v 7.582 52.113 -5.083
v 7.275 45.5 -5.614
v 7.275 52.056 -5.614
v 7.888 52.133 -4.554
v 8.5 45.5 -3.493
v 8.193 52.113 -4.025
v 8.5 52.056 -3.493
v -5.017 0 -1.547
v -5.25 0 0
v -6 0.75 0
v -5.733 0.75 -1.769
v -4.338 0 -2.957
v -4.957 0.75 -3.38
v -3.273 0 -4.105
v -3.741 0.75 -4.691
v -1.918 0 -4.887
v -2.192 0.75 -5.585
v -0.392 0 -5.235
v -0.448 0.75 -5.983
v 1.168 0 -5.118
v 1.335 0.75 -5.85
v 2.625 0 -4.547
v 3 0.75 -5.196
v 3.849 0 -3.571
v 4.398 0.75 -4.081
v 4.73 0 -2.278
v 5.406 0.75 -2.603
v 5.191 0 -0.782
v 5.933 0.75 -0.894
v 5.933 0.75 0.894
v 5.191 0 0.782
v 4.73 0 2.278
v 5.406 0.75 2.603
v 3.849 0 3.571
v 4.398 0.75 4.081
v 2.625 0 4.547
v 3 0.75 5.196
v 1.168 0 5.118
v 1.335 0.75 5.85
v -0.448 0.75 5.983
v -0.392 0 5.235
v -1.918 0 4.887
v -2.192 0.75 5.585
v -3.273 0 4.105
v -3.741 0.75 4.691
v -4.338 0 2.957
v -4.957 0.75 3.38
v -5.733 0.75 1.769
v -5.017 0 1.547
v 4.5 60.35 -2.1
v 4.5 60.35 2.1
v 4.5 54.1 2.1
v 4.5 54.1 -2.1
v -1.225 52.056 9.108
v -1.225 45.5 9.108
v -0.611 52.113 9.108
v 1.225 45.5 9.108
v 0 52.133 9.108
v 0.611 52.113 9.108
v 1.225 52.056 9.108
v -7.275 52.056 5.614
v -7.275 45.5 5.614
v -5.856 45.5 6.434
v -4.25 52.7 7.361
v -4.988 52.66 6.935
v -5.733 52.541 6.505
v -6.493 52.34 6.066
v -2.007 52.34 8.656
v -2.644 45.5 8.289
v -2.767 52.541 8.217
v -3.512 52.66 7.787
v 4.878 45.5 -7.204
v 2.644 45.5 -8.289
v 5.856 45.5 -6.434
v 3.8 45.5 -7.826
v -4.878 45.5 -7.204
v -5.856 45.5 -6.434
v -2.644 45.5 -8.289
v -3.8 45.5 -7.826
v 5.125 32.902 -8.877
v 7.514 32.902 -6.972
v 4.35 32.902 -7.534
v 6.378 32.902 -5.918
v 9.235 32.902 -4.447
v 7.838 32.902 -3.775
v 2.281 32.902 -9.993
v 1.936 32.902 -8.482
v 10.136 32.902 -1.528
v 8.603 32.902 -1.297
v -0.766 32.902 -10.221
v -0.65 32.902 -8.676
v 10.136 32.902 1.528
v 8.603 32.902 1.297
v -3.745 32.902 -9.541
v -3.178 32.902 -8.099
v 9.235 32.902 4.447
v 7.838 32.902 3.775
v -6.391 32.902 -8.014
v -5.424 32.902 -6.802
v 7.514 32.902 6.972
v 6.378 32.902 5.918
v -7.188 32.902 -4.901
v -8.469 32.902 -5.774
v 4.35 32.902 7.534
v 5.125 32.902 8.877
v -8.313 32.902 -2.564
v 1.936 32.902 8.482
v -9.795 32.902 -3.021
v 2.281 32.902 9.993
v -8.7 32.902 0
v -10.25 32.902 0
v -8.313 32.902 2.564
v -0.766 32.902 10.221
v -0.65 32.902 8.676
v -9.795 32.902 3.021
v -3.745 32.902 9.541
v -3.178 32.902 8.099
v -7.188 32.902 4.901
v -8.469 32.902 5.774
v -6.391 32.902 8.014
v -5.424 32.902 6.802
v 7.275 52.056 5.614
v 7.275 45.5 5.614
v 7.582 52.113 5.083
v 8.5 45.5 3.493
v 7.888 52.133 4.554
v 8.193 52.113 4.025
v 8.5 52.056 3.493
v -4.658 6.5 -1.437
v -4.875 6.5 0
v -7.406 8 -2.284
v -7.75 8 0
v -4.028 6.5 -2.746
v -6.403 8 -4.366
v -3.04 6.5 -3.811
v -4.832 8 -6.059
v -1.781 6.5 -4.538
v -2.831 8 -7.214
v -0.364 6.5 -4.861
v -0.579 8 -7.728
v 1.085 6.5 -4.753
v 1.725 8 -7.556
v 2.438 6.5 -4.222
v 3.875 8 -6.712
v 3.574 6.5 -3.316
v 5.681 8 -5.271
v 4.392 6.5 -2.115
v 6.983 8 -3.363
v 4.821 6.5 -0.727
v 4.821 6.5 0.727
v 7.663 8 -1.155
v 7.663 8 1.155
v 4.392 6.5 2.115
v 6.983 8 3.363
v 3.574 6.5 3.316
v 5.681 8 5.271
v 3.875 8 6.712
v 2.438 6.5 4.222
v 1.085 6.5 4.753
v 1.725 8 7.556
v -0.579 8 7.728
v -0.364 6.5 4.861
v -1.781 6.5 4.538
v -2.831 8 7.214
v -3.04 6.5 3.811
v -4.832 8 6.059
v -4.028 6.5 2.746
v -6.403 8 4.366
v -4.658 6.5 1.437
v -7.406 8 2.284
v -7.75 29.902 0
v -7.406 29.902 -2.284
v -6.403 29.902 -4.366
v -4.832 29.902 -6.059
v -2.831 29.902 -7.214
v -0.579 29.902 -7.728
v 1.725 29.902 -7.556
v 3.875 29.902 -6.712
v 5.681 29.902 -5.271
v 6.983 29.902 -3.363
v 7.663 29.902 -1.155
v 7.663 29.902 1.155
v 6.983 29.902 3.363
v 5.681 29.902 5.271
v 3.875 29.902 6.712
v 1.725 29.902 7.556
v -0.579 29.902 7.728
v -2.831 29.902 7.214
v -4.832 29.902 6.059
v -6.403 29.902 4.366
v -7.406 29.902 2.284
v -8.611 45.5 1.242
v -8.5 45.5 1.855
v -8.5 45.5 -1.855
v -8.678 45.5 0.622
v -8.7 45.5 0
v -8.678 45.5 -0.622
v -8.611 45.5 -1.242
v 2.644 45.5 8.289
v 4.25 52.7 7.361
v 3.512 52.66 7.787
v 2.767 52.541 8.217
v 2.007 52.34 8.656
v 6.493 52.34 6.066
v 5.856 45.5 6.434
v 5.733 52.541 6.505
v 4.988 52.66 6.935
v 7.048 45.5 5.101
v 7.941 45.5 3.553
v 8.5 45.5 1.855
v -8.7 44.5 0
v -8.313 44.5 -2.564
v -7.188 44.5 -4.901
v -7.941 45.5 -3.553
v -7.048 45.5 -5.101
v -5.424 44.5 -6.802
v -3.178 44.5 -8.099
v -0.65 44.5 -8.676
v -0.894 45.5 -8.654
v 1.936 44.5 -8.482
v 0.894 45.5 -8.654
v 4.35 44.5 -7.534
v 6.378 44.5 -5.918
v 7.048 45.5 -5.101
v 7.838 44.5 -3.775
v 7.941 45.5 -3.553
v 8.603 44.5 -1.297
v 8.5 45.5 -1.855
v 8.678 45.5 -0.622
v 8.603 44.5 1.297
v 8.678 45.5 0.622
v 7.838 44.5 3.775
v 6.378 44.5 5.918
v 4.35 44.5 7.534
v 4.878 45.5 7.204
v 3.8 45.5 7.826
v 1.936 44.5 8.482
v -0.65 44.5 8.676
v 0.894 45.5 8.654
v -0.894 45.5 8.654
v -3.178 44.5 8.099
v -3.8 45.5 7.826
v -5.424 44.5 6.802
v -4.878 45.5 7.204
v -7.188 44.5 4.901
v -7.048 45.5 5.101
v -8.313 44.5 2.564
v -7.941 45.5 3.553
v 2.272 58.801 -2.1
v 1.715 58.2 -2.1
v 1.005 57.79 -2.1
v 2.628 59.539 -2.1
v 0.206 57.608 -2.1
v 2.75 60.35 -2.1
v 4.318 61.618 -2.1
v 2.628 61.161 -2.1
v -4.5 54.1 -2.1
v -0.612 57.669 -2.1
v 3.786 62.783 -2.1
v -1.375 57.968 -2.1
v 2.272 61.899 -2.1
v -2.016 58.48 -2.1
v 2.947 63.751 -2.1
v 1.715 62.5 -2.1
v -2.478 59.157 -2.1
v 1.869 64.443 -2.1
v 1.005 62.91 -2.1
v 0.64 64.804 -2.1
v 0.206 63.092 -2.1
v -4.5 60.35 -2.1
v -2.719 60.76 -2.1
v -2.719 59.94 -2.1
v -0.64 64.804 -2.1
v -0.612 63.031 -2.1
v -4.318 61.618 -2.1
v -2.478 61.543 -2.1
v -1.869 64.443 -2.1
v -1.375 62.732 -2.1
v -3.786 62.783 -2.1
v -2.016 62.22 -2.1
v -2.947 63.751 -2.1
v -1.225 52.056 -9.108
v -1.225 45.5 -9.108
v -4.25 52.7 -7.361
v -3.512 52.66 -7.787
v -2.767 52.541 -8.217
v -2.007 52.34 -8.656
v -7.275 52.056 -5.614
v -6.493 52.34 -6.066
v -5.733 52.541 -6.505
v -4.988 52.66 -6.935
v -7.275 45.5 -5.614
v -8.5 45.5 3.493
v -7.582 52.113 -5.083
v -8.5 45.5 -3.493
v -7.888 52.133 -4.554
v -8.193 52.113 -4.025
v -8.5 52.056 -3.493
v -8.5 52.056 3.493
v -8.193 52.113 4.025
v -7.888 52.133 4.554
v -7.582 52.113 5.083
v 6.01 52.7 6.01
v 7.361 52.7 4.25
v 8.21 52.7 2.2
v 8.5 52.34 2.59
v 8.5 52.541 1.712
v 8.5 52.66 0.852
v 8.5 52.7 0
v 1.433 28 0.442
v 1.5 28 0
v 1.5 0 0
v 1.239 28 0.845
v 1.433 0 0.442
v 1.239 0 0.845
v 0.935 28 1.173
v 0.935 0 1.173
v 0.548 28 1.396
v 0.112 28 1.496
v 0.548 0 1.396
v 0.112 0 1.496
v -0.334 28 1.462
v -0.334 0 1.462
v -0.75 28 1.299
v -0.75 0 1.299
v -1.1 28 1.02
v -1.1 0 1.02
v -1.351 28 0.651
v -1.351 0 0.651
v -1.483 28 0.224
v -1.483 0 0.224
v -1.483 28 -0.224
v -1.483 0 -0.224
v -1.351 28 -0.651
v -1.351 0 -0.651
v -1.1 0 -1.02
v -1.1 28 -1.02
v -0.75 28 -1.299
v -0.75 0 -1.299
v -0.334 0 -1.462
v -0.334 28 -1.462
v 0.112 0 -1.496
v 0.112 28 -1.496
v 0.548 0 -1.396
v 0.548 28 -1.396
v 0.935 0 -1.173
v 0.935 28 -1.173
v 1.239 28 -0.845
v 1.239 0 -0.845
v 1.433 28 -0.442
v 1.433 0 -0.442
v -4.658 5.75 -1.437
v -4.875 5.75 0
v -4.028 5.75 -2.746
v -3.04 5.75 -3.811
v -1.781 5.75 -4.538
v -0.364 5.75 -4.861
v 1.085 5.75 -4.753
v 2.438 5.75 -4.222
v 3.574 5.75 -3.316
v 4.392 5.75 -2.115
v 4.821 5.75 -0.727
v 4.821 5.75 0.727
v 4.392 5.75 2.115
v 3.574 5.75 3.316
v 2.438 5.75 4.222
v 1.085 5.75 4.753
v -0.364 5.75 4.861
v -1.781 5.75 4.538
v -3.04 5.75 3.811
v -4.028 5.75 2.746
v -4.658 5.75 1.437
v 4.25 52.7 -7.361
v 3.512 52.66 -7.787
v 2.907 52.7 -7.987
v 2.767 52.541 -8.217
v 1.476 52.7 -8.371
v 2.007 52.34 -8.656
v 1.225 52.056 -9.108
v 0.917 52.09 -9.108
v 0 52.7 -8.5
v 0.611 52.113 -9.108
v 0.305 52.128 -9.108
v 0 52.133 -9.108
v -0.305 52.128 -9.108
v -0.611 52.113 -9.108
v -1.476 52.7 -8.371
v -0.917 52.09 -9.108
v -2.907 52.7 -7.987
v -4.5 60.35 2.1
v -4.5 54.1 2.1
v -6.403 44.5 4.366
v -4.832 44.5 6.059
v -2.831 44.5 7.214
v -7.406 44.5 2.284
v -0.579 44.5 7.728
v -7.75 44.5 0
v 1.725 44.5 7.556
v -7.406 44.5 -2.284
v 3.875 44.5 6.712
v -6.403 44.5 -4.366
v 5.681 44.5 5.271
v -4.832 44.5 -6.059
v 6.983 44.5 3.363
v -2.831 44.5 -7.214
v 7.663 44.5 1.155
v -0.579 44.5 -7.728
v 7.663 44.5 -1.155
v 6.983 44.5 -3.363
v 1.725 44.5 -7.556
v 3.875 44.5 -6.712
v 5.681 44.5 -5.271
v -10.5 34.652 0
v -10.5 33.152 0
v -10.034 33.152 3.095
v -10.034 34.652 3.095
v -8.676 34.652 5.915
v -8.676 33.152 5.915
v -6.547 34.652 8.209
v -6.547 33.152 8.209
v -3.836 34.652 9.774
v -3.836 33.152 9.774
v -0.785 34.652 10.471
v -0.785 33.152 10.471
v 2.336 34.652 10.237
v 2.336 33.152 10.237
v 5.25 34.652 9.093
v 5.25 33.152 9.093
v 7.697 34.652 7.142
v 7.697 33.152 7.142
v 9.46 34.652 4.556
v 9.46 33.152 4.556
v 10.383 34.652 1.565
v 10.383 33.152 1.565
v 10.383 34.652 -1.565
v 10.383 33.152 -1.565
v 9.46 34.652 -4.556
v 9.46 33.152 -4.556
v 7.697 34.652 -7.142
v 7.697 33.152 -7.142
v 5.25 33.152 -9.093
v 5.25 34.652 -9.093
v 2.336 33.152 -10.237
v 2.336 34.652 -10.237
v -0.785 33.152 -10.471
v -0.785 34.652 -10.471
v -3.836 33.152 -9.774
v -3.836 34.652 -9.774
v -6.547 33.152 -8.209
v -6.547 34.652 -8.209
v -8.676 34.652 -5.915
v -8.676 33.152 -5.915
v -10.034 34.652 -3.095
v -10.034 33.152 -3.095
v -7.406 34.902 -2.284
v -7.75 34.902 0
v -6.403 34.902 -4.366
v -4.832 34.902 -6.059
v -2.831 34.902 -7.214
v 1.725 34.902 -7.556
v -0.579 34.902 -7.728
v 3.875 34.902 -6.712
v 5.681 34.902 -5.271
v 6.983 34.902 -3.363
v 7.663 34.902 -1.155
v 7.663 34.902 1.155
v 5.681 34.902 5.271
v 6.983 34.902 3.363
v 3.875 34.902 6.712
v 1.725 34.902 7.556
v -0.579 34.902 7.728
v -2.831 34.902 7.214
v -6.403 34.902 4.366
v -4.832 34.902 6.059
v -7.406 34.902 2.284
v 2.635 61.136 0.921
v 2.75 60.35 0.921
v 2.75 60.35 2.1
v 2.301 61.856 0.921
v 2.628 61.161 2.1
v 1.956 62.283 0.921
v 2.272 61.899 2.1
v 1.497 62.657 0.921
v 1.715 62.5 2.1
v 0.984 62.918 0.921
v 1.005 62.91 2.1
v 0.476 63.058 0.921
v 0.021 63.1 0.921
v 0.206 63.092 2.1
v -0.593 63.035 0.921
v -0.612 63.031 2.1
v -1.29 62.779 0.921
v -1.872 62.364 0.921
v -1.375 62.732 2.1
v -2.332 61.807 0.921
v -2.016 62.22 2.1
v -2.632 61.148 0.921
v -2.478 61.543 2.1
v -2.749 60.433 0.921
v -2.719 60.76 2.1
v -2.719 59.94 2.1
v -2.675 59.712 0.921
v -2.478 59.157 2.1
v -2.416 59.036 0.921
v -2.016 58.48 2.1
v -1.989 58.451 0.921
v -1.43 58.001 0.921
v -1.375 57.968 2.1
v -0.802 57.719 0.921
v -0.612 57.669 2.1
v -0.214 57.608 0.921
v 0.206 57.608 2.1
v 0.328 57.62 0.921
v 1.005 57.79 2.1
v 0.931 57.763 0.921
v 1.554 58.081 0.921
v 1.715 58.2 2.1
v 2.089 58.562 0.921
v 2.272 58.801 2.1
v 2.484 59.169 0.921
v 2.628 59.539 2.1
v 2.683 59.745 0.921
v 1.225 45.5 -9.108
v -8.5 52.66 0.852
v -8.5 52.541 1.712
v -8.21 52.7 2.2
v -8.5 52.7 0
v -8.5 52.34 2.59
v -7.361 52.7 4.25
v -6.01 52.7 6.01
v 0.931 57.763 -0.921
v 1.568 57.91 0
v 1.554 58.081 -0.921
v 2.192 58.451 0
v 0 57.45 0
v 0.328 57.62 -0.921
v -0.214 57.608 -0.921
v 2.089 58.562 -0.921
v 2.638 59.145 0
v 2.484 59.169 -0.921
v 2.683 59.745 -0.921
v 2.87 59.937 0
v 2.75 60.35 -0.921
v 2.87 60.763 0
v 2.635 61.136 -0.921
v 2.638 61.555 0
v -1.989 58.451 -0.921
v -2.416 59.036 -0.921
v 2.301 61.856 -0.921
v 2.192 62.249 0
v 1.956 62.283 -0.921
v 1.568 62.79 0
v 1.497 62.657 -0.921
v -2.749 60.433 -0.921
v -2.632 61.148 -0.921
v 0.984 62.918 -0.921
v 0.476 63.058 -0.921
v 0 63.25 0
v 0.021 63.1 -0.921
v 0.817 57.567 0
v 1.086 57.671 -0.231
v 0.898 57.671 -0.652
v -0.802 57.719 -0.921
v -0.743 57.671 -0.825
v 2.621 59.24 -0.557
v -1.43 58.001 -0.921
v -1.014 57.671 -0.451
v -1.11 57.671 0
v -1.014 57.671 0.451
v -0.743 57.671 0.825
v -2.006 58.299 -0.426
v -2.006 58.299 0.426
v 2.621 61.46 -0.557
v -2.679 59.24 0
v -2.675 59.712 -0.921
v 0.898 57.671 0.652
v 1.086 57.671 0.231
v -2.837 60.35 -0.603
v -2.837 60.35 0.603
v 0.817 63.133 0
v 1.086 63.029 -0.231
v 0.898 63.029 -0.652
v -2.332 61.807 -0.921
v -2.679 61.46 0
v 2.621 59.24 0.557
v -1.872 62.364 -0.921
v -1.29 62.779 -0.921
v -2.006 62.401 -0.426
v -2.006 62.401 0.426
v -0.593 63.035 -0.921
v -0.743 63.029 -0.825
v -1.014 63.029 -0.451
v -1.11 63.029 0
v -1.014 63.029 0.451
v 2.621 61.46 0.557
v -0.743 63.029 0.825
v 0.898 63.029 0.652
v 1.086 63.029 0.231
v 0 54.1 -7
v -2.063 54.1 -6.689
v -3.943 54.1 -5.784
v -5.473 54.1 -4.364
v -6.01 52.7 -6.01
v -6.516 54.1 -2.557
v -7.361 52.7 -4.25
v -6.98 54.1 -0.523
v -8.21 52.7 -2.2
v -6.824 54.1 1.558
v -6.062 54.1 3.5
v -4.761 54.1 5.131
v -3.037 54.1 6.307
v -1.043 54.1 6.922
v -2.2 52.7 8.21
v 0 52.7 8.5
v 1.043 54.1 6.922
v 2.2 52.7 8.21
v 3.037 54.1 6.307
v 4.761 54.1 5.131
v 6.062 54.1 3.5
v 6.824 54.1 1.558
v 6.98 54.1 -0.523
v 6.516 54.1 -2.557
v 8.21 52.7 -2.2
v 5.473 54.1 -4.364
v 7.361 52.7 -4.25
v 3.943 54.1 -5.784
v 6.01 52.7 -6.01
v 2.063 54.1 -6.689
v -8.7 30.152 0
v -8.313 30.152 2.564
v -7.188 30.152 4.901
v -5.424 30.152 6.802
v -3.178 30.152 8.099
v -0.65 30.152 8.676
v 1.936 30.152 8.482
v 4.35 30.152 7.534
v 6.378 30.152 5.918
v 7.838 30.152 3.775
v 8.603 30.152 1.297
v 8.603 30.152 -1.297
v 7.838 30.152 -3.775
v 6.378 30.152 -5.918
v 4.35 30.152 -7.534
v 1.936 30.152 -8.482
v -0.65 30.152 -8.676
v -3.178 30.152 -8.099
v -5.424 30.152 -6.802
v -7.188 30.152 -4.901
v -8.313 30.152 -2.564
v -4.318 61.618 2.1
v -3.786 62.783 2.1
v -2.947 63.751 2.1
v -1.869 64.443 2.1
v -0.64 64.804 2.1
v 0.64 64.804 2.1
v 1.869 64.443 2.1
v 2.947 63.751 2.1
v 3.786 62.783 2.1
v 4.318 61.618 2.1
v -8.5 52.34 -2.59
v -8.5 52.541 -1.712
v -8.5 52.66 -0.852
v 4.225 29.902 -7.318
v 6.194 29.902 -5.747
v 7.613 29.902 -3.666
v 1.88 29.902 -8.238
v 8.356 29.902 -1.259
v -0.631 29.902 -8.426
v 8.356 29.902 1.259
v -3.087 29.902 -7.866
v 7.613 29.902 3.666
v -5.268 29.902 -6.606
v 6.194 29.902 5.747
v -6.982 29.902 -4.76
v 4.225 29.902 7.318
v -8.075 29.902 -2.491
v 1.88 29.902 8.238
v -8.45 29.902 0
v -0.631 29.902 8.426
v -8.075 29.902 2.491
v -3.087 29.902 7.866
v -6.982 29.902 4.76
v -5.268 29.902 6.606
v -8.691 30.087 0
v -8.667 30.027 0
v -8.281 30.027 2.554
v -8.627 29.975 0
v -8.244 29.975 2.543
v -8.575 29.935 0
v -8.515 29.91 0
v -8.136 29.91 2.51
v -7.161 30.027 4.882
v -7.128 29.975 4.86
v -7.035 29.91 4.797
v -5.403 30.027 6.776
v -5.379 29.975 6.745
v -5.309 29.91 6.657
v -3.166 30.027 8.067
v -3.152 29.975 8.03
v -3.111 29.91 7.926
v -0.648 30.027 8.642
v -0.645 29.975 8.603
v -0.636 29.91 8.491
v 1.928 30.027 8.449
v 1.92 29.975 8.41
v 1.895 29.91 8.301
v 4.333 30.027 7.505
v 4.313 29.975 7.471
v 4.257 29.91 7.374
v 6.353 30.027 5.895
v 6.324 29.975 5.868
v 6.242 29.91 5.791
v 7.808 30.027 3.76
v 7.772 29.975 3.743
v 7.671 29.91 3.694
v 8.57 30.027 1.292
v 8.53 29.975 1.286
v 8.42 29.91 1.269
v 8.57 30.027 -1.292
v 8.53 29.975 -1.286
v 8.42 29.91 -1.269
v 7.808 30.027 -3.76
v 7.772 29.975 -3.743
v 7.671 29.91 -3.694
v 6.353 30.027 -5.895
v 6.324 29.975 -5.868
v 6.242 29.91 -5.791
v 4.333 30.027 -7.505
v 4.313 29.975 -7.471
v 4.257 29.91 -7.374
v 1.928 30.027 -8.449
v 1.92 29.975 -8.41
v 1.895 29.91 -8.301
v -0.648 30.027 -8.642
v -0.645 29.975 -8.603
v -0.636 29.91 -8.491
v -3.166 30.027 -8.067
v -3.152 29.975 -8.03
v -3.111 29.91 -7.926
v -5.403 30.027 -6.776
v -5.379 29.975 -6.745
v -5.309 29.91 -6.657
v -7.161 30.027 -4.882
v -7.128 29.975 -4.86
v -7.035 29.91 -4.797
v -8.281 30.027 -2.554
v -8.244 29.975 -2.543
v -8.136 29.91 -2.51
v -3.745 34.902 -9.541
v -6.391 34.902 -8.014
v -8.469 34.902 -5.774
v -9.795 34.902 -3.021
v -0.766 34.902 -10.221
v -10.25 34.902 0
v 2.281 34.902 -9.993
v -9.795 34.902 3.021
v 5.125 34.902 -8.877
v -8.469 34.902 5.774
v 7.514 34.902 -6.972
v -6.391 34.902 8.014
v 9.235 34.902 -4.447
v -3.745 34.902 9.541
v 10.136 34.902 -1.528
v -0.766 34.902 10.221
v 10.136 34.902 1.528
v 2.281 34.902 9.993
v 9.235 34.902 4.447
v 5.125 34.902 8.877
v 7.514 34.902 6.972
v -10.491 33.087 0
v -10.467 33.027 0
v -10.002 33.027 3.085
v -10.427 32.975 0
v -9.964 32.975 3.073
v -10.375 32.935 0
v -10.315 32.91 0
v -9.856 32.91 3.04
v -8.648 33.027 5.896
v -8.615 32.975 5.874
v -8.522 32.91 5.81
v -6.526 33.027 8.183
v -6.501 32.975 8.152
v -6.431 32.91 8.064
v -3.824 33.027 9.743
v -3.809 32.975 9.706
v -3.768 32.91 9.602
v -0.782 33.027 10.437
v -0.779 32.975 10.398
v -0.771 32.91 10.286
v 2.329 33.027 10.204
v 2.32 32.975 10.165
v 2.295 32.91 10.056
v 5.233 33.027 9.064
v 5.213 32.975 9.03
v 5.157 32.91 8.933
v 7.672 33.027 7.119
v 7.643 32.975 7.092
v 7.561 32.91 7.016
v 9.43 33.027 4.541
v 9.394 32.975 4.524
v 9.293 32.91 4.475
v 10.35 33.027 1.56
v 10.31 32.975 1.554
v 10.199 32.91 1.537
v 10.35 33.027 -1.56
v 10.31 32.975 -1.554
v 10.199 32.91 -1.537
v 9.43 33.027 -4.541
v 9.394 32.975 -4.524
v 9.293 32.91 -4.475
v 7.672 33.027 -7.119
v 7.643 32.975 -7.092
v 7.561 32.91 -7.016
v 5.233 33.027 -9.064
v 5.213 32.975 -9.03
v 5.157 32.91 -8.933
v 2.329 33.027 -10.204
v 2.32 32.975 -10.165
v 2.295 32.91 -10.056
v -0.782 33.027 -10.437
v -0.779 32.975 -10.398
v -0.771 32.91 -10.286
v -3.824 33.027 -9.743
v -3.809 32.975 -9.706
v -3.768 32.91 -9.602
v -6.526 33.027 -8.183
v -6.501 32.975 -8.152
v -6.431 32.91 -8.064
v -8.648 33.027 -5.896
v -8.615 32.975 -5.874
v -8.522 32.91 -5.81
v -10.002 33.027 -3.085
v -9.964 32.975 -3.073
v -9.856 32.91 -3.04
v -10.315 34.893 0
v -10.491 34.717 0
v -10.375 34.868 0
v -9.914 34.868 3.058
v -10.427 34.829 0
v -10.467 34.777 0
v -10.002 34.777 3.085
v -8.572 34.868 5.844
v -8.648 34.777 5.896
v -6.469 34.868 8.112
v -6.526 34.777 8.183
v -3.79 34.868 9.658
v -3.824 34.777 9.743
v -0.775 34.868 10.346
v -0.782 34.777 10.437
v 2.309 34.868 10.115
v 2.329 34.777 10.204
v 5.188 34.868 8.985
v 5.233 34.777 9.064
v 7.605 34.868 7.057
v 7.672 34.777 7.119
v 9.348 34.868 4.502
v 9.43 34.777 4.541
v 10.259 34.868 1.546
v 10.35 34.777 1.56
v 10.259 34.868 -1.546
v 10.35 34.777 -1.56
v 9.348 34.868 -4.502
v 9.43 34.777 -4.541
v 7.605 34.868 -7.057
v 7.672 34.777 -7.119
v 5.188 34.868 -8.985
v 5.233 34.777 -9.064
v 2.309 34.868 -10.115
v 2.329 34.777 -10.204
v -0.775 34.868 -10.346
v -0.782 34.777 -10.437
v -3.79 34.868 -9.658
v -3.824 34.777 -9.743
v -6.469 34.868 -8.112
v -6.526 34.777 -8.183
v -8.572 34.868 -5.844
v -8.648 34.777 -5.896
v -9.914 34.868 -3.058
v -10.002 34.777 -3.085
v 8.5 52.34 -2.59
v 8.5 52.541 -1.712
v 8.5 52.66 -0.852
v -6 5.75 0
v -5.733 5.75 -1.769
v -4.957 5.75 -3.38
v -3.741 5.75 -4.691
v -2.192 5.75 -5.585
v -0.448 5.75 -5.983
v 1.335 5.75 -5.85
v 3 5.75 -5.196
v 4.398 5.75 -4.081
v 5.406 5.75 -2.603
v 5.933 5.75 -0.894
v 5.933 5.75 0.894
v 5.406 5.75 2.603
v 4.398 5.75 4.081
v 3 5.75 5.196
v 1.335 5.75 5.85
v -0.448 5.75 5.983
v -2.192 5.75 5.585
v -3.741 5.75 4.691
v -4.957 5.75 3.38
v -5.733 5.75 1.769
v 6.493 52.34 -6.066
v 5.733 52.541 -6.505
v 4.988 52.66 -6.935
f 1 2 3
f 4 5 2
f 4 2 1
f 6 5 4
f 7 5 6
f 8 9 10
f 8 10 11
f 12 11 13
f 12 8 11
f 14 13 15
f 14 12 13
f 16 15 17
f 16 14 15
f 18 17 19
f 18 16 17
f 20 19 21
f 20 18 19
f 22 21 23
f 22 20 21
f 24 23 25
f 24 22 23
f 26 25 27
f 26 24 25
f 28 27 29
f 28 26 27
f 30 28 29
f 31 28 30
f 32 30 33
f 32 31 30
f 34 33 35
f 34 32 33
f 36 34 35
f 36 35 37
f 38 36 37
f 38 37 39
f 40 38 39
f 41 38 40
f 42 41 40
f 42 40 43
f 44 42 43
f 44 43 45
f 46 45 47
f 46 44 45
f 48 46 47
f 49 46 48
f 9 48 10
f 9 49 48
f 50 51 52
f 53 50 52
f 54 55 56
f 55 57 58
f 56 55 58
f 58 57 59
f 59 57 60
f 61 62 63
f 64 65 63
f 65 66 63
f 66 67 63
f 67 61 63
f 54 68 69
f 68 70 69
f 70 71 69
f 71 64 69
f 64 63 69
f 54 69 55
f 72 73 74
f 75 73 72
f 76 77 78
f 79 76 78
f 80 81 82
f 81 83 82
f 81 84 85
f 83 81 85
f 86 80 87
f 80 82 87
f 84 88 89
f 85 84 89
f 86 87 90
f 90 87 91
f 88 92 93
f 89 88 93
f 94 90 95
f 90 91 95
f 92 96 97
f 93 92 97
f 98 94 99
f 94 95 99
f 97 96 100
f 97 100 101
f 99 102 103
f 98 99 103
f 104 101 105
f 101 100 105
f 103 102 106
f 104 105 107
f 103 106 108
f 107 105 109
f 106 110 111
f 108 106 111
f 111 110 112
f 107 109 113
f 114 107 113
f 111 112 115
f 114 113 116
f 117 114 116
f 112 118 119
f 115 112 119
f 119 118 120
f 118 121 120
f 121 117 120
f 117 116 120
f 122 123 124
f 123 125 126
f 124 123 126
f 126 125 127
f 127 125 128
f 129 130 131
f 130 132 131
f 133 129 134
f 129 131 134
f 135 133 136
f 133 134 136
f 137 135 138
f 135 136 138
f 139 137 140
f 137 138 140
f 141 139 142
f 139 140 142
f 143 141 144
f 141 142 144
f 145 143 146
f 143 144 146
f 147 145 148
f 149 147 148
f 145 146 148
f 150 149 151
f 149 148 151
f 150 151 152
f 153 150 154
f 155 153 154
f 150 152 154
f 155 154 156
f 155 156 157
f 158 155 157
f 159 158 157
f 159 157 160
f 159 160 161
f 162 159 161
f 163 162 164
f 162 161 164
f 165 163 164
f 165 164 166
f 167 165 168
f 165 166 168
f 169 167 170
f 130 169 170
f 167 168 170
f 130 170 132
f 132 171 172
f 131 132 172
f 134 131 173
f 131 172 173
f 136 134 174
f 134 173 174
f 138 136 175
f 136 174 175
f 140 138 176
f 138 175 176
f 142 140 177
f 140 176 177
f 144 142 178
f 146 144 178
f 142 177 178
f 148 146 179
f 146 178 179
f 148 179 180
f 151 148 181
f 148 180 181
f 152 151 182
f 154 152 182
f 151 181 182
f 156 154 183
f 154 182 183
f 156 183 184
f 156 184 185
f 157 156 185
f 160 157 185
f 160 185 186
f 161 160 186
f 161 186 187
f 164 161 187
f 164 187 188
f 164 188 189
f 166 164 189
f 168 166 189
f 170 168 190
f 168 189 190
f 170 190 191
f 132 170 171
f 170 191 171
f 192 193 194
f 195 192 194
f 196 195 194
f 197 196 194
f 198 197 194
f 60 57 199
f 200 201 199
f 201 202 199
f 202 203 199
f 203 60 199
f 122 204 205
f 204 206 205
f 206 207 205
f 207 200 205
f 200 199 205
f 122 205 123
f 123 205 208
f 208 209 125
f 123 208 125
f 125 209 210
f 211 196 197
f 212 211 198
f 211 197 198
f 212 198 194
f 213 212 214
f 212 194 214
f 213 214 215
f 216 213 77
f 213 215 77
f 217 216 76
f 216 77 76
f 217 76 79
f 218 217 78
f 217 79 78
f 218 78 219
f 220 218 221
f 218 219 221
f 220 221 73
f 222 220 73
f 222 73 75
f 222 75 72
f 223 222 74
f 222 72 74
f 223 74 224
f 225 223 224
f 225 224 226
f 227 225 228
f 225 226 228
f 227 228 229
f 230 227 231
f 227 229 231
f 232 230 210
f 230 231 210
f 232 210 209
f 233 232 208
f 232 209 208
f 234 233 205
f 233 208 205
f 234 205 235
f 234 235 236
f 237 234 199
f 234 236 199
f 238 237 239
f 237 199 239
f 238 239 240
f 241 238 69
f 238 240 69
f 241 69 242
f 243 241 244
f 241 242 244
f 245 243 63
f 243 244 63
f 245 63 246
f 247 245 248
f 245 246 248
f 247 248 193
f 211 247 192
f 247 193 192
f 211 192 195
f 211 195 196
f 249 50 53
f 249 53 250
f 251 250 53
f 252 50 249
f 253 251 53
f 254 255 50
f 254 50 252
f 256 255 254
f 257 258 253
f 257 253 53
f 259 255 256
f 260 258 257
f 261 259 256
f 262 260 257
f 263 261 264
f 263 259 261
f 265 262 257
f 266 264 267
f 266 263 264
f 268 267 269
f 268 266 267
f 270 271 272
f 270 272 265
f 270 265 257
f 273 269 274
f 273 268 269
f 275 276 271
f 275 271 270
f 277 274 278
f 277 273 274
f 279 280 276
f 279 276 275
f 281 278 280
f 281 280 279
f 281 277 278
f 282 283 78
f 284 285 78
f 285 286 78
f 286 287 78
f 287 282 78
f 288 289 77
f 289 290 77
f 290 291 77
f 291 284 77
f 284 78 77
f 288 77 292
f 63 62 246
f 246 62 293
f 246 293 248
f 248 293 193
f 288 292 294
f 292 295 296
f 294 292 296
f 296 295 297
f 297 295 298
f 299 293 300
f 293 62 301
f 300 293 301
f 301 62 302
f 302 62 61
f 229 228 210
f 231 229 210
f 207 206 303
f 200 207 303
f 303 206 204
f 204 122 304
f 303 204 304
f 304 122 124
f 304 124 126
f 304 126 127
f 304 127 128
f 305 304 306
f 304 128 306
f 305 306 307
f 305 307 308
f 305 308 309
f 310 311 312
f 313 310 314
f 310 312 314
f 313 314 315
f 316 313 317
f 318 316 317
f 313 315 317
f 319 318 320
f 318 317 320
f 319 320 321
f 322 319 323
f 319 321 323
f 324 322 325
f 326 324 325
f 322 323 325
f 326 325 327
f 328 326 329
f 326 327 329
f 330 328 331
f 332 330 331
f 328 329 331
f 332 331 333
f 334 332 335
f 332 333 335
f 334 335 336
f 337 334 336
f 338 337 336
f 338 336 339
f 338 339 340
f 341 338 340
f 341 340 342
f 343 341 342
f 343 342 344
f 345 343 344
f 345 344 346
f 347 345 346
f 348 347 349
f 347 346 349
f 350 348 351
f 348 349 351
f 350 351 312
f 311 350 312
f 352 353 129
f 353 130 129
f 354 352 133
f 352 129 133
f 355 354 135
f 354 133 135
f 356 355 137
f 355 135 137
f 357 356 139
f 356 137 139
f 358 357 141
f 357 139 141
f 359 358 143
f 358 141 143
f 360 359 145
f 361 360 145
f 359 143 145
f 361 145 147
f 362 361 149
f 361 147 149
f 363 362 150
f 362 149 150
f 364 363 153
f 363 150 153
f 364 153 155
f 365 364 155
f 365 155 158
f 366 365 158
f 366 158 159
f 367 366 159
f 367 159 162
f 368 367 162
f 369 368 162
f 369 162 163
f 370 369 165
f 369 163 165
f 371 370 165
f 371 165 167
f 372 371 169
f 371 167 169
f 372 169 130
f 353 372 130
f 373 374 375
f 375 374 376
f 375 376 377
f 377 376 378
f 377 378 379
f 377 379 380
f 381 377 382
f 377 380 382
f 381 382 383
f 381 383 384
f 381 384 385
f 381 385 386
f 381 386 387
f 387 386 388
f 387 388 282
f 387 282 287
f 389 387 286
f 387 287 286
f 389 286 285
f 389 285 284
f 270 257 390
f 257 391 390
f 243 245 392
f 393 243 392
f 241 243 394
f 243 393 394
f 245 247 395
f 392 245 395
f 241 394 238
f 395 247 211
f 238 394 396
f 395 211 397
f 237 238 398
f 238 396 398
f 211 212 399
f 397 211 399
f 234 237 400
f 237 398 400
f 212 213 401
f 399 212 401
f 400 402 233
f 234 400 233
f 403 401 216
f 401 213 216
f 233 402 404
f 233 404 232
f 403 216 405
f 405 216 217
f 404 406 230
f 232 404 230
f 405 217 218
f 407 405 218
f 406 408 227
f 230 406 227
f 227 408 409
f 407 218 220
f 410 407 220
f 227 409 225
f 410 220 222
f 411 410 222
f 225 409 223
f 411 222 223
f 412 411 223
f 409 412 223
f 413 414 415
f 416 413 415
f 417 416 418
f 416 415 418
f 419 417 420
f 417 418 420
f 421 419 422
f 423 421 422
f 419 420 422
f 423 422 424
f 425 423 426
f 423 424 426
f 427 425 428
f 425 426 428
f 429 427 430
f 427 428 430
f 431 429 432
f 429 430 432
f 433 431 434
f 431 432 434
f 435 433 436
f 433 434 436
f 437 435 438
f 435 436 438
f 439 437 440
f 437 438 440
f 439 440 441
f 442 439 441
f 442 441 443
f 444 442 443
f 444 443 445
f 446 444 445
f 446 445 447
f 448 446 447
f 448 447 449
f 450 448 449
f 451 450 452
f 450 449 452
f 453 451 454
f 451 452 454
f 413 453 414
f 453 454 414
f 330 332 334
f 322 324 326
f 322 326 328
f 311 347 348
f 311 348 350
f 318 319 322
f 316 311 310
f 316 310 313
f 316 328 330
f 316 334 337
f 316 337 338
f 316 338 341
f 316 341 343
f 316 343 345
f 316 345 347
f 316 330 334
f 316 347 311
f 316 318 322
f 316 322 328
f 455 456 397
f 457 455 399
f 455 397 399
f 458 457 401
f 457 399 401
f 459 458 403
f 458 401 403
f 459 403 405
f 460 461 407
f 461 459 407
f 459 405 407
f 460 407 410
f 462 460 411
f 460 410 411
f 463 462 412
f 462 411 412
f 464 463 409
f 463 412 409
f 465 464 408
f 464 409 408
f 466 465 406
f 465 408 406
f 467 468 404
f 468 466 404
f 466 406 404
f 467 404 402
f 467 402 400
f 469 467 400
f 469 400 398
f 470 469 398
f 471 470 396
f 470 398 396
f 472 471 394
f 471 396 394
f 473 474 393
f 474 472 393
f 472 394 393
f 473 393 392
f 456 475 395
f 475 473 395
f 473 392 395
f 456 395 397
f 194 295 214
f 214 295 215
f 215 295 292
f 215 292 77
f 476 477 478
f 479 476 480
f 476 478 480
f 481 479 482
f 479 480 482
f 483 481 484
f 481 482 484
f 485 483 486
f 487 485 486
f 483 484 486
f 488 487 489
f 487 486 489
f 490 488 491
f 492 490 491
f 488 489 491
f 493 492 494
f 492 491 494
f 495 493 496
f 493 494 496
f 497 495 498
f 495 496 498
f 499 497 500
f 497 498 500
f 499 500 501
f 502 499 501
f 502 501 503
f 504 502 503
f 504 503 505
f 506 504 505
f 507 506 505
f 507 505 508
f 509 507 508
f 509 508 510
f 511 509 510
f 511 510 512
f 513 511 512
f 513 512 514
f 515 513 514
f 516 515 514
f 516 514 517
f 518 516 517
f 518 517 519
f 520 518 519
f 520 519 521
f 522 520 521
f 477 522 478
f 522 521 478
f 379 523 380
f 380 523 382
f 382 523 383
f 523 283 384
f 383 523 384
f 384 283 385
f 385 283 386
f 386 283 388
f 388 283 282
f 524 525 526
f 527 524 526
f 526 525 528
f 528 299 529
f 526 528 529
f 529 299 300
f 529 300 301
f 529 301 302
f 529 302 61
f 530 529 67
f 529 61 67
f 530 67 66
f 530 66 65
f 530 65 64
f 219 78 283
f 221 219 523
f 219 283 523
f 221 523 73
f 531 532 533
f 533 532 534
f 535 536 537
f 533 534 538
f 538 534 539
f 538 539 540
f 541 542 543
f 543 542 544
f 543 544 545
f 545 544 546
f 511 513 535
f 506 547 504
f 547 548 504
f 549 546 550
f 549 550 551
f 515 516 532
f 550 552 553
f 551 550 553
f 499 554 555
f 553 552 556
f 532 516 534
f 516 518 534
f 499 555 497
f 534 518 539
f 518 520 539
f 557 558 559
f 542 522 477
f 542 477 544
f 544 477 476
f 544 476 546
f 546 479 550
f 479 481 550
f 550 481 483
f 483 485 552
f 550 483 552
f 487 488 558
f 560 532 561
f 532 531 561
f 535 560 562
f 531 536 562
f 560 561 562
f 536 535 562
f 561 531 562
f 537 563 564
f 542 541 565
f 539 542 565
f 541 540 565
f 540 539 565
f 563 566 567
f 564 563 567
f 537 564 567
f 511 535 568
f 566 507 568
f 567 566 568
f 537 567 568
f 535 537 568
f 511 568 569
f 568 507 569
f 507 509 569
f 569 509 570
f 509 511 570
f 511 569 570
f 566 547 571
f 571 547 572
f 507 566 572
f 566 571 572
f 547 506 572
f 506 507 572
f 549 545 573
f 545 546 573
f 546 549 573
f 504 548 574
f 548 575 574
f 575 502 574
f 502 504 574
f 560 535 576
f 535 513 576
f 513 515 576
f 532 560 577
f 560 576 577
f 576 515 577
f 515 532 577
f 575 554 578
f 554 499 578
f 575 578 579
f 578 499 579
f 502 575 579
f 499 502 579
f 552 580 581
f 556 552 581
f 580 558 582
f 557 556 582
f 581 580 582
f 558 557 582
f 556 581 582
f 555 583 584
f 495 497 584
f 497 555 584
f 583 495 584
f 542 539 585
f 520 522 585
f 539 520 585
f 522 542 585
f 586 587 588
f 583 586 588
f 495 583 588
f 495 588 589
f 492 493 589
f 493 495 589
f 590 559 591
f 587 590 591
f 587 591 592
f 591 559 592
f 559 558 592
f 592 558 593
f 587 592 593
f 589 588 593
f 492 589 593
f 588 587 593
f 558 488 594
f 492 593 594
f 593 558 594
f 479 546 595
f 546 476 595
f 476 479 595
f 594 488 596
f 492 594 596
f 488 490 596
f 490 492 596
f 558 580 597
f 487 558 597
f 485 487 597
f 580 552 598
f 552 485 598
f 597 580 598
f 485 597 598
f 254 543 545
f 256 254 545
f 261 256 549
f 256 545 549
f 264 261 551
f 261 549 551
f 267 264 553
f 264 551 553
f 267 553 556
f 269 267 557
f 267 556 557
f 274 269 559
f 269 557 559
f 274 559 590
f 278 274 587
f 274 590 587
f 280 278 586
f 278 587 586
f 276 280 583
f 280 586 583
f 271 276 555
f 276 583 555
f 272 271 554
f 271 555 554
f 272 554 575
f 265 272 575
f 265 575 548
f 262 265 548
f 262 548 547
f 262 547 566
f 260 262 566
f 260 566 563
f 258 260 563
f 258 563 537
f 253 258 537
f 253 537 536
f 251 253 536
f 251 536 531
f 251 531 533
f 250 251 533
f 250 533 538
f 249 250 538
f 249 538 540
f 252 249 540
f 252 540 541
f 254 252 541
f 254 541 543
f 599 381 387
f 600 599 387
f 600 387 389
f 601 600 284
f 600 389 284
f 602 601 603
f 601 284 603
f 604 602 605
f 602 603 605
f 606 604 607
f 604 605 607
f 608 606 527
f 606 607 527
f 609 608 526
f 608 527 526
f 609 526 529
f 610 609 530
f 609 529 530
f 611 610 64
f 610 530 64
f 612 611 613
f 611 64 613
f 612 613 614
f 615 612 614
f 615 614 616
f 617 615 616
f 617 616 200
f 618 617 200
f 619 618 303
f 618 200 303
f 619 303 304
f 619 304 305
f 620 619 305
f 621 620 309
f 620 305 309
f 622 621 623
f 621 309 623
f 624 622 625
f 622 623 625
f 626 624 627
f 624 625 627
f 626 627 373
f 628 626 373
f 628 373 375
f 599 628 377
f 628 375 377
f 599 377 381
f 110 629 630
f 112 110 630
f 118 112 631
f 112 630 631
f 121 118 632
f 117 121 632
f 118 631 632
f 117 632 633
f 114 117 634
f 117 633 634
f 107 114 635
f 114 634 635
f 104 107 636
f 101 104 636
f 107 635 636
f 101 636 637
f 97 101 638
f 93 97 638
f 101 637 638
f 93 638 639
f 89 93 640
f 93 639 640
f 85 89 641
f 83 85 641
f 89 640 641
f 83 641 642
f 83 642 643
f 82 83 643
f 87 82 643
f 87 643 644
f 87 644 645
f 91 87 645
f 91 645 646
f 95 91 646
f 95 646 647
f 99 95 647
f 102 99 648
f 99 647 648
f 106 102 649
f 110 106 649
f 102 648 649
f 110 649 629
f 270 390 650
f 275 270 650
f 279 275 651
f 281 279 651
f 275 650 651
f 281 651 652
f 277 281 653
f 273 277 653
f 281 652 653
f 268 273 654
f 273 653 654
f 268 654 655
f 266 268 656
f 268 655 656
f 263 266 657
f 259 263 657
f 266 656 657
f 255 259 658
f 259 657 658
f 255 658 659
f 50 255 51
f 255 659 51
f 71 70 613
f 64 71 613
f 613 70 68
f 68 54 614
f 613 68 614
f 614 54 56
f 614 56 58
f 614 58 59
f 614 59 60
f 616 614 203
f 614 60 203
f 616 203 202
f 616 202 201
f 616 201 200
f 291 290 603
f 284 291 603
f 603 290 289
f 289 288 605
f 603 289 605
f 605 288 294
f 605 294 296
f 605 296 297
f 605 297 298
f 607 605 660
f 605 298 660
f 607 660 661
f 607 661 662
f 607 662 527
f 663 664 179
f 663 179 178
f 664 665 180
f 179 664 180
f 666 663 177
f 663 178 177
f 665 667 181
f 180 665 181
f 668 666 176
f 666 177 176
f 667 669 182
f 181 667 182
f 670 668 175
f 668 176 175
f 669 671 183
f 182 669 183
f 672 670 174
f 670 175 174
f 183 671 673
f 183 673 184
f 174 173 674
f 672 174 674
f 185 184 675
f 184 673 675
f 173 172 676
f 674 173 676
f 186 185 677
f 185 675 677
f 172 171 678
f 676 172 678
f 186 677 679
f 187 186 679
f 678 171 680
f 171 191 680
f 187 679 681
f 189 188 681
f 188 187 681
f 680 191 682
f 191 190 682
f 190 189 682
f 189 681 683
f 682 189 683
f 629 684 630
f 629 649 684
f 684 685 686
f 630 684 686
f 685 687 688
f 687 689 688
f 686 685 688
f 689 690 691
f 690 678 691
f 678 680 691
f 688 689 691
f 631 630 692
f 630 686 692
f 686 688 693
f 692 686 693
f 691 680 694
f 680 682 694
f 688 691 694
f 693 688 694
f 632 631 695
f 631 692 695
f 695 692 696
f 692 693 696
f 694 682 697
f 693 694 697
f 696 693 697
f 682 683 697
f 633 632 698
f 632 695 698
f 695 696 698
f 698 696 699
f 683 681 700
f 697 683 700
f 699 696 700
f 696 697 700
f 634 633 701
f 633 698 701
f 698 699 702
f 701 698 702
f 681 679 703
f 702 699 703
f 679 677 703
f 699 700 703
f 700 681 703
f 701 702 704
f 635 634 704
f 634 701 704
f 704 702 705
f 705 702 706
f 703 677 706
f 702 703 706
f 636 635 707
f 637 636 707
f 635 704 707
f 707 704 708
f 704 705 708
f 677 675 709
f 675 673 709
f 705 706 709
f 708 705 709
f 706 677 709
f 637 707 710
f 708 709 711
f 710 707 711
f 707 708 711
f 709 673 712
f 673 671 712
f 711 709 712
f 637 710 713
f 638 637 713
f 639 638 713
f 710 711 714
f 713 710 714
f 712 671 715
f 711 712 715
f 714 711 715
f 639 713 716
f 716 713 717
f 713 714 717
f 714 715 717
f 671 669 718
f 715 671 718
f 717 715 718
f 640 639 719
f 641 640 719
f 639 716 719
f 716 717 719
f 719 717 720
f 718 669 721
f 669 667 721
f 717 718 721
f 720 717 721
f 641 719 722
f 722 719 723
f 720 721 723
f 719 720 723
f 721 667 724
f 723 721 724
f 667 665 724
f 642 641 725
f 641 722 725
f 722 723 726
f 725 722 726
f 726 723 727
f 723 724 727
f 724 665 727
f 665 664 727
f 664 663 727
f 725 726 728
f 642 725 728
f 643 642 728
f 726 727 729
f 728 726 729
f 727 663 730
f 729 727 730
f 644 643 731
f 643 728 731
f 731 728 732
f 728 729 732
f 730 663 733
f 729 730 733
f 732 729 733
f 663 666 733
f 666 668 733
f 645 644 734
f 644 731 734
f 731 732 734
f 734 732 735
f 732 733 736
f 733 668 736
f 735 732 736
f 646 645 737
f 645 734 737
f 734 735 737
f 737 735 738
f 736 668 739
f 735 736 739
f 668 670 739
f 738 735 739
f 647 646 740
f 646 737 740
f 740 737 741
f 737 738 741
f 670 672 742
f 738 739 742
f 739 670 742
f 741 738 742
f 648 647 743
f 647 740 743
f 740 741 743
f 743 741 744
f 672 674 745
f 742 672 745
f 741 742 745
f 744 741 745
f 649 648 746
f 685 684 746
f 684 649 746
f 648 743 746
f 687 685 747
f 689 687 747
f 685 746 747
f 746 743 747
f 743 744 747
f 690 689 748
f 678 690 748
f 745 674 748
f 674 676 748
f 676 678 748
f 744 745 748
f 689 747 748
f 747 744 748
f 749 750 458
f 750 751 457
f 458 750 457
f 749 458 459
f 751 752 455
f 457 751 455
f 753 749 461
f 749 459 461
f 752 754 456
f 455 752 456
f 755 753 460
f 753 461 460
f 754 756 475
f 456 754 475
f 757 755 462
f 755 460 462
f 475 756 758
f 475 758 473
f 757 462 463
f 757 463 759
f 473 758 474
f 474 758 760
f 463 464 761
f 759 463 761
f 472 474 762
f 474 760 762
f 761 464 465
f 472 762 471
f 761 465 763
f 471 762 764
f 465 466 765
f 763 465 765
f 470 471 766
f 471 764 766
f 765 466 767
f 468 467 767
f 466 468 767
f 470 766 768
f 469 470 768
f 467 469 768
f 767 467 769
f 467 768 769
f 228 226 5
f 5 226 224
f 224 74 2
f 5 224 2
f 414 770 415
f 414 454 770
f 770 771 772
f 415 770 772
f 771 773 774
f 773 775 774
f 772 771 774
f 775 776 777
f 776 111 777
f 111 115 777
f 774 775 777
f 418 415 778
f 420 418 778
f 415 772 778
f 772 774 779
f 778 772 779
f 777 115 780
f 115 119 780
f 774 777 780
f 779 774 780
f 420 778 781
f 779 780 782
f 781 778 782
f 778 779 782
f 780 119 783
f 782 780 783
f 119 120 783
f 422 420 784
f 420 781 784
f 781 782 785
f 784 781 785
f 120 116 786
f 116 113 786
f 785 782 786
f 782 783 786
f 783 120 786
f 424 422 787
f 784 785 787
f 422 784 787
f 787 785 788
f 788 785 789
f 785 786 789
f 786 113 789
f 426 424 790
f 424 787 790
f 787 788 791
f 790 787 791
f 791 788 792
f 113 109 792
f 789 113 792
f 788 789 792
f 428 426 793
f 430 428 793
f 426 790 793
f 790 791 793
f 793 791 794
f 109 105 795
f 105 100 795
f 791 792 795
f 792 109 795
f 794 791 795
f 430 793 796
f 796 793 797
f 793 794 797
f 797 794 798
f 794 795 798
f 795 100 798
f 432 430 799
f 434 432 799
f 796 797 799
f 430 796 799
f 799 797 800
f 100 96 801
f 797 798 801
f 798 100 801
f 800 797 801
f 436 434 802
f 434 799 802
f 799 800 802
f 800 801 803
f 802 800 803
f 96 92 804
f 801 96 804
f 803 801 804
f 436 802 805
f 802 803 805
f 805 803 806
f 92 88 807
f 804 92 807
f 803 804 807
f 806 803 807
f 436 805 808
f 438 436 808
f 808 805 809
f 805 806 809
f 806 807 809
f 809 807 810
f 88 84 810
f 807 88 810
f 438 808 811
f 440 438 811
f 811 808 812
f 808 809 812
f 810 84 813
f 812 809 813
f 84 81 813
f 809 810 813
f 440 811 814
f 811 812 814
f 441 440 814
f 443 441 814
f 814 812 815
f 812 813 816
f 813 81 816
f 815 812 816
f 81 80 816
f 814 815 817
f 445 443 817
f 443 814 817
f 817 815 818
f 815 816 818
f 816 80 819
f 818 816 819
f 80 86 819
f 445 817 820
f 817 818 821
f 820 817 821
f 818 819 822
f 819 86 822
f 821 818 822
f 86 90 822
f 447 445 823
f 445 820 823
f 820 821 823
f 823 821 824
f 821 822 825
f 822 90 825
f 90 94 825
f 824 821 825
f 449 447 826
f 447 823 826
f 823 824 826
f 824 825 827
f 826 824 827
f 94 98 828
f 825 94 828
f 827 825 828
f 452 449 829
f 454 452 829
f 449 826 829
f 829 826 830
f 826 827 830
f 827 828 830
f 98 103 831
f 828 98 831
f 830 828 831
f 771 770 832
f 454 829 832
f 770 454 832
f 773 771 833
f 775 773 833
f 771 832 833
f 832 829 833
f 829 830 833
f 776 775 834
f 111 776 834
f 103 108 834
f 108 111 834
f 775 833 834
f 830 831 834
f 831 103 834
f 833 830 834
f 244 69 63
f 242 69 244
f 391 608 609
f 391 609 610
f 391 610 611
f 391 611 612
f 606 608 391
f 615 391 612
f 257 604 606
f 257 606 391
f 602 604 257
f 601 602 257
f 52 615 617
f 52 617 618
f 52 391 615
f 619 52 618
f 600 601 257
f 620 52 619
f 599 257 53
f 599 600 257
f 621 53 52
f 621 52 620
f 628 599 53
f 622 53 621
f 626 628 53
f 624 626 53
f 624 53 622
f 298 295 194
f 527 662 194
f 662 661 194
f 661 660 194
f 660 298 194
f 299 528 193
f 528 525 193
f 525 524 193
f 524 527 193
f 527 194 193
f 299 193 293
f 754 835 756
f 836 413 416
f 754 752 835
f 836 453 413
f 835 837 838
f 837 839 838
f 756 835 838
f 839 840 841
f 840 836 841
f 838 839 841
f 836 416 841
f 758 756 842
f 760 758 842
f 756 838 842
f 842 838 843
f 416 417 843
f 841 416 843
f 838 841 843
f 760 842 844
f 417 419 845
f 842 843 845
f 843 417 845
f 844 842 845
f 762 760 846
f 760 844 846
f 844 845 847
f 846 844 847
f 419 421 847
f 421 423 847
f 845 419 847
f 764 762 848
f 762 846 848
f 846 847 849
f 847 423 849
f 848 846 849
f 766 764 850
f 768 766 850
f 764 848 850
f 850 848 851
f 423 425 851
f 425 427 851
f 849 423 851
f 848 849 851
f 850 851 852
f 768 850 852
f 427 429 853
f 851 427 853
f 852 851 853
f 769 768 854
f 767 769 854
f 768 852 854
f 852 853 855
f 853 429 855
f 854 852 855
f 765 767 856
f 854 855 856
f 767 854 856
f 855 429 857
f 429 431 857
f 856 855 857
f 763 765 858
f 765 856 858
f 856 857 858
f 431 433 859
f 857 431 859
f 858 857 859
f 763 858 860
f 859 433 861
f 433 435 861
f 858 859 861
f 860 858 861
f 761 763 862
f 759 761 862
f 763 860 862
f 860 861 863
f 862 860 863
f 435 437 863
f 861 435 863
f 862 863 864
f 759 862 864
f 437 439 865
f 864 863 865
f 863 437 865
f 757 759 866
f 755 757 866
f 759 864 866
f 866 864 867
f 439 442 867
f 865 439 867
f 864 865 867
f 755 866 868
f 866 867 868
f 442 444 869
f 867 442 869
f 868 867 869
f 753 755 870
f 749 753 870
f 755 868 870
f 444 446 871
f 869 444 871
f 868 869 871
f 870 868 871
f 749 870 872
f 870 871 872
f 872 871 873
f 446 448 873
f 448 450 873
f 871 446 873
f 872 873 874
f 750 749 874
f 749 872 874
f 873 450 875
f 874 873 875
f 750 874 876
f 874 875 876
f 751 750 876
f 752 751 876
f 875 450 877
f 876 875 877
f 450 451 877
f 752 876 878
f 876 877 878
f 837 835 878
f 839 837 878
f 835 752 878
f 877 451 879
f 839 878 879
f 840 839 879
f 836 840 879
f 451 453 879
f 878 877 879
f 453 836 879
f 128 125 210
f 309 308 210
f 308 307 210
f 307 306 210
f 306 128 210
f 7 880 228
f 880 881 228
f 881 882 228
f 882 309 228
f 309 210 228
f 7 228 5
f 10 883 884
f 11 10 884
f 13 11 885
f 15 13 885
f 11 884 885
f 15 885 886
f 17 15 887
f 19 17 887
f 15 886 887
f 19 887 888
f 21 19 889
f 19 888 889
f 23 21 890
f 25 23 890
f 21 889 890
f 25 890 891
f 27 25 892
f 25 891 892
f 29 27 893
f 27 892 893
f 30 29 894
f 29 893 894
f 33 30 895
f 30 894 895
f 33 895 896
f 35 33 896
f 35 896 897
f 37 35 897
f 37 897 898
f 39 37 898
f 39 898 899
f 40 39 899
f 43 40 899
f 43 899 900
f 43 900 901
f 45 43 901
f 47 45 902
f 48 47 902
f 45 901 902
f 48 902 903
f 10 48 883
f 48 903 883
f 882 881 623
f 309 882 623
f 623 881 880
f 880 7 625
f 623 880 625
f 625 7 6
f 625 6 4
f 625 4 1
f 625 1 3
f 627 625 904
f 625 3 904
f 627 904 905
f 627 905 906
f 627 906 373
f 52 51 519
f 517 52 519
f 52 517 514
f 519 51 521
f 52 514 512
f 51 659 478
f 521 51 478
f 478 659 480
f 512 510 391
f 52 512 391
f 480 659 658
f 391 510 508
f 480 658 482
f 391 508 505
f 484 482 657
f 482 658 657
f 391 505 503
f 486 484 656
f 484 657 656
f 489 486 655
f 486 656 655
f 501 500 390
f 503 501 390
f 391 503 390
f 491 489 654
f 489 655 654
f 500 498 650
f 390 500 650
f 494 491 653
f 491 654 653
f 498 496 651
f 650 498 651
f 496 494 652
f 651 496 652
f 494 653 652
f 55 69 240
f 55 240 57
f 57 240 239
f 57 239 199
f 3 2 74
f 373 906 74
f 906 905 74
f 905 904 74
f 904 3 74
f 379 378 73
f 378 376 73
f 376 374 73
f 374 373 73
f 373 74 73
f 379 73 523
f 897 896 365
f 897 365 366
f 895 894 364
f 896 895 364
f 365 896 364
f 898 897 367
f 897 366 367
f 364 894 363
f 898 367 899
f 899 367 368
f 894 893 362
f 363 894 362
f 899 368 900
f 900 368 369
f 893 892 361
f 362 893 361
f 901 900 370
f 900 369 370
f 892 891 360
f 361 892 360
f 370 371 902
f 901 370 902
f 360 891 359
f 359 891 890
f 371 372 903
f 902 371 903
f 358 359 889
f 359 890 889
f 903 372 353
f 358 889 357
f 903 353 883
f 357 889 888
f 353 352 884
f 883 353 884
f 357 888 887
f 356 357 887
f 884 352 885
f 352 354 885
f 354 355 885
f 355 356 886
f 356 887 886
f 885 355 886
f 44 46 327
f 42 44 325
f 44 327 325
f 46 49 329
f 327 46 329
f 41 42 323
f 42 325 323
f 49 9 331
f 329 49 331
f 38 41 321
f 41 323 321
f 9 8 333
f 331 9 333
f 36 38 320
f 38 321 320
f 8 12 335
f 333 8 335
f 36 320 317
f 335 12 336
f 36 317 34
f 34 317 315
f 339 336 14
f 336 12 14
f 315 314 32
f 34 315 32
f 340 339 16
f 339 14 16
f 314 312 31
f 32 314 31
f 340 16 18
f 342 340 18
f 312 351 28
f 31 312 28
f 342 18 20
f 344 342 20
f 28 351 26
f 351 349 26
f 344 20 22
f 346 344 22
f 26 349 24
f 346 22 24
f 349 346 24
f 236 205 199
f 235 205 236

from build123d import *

# Parameters (mm, degrees)
BOSS_EXTRUDE1_DEPTH  = 8.6
CHAMFER1_SIZE        = 1.414
CHAMFER1_EDGE_2_SIZE = 1.414
CHAMFER1_EDGE_3_SIZE = 1.414
CHAMFER1_EDGE_4_SIZE = 1.414
CHAMFER1_EDGE_5_SIZE = 1.414
CHAMFER1_EDGE_6_SIZE = 1.414
FILLET1_R            = 0.25
SKETCH6_R            = 1.5
CUT_EXTRUDE1_DEPTH   = 28
BOSS_EXTRUDE2_DEPTH  = 2.1
SKETCH9_R            = 2.75
CUT_EXTRUDE2_DEPTH   = 4.2
CHAMFER3_SIZE        = 0.75


with BuildPart() as part:
    # Sketch1 → Revolve1 (revolve)
    with BuildSketch(Plane.XY, mode=Mode.PRIVATE) as revolve1_sk:
        Polygon((0, 0), (6, 0), (6, 5.75), (4.875, 5.75), (4.875, 6.5), (7.75, 8), (7.75, 44.5), (8.7, 44.5), (8.7, 45.5), (0, 45.5), align=None)
    revolve(revolve1_sk.sketch.rotate(Axis((0, 45.5, 0), (0, -1, 0)), 180), axis=Axis((0, 45.5, 0), (0, -1, 0)))

    # Sketch3 → Boss-Extrude1 (add)
    with BuildSketch(Plane(origin=(0, 45.5, 0), x_dir=(1, 0, 0), z_dir=(0, 1, 0))):
        Polygon((0, 9.814954576), (-8.5, 4.907477288), (-8.5, -4.907477288), (0, -9.814954576), (8.5, -4.907477288), (8.5, 4.907477288), align=None)
    extrude(amount=BOSS_EXTRUDE1_DEPTH)

    # Chamfer1
    chamfer1_edges = [part.edges().sort_by_distance(p)[0] for p in [
        (8.5, 49.8, -4.907477288),
    ]]
    chamfer(chamfer1_edges, length=CHAMFER1_SIZE)

    # Chamfer1 edge 2
    chamfer1_edge_2_edges = [part.edges().sort_by_distance(p)[0] for p in [
        (0, 49.8, -9.814954576),
    ]]
    chamfer(chamfer1_edge_2_edges, length=CHAMFER1_EDGE_2_SIZE)

    # Chamfer1 edge 3
    chamfer1_edge_3_edges = [part.edges().sort_by_distance(p)[0] for p in [
        (-8.5, 49.8, -4.907477288),
    ]]
    chamfer(chamfer1_edge_3_edges, length=CHAMFER1_EDGE_3_SIZE)

    # Chamfer1 edge 4
    chamfer1_edge_4_edges = [part.edges().sort_by_distance(p)[0] for p in [
        (-8.5, 49.8, 4.907477288),
    ]]
    chamfer(chamfer1_edge_4_edges, length=CHAMFER1_EDGE_4_SIZE)

    # Chamfer1 edge 5
    chamfer1_edge_5_edges = [part.edges().sort_by_distance(p)[0] for p in [
        (0, 49.8, 9.814954576),
    ]]
    chamfer(chamfer1_edge_5_edges, length=CHAMFER1_EDGE_5_SIZE)

    # Chamfer1 edge 6
    chamfer1_edge_6_edges = [part.edges().sort_by_distance(p)[0] for p in [
        (8.5, 49.8, 4.907477288),
    ]]
    chamfer(chamfer1_edge_6_edges, length=CHAMFER1_EDGE_6_SIZE)

    # Sketch5 → Revolve2 (revolve)
    with BuildSketch(Plane.XY, mode=Mode.PRIVATE) as revolve2_sk:
        Polygon((7.75, 34.901965379), (10.5, 34.901965379), (10.5, 32.901965379), (8.7, 32.901965379), (8.7, 29.901965379), (7.75, 29.901965379), align=None)
    revolve(revolve2_sk.sketch.rotate(Axis((0, 0, 0), (0, 1, 0)), 180), axis=Axis((0, 0, 0), (0, 1, 0)))

    # Fillet1
    fillet1_edges = [part.edges().sort_by_distance(p)[0] for p in [
        (10.5, 34.901965379, 0),
        (10.5, 32.901965379, 0),
        (8.7, 29.901965379, 0),
    ]]
    fillet(fillet1_edges, radius=FILLET1_R)

    # Sketch6 → Cut-Extrude1 (cut)
    with BuildSketch(Plane.XZ):
        Circle(SKETCH6_R)
    extrude(amount=-CUT_EXTRUDE1_DEPTH, mode=Mode.SUBTRACT)

    # Sketch7 → Boss-Extrude2 (add, symmetric)
    with BuildSketch(Plane.XY):
        with BuildLine():
            Line((4.5, 60.35), (4.5, 54.1))
            Line((4.5, 54.1), (-4.5, 54.1))
            Line((-4.5, 54.1), (-4.5, 60.35))
            ThreePointArc((-4.5, 60.35), (0, 64.85), (4.5, 60.35))
        make_face()
    extrude(amount=BOSS_EXTRUDE2_DEPTH, both=True)

    # Sketch8 → Cut-Revolve1 (revolve, cut)
    with BuildSketch(Plane.XY):
        with BuildLine():
            Line((0, 63.25), (0, 57.45))
            ThreePointArc((0, 57.45), (2.9, 60.35), (0, 63.25))
        make_face()
    revolve(axis=Axis((0, 54.1, 0), (0, 1, 0)), mode=Mode.SUBTRACT)

    # Sketch9 → Cut-Extrude2 (cut)
    with BuildSketch(Plane.XY.offset(2.1)):
        with Locations((0, 60.35)):
            Circle(SKETCH9_R)
    extrude(amount=-CUT_EXTRUDE2_DEPTH, mode=Mode.SUBTRACT)

    # Sketch10 → Cut-Revolve2 (revolve, cut)
    with BuildSketch(Plane.XY, mode=Mode.PRIVATE) as cut_revolve2_sk:
        Polygon((7, 54.1), (8.5, 52.7), (10.124681139, 51.183630937), (10.124681139, 53.919402207), (7, 56.83577127), align=None)
    revolve(cut_revolve2_sk.sketch.rotate(Axis((0, 0, 0), (0, 1, 0)), 90), axis=Axis((0, 0, 0), (0, 1, 0)), mode=Mode.SUBTRACT)

    # Chamfer3
    chamfer3_edges = [part.edges().sort_by_distance(p)[0] for p in [
        (6, 0, 0),
    ]]
    chamfer(chamfer3_edges, length=CHAMFER3_SIZE)


solid = part.part
